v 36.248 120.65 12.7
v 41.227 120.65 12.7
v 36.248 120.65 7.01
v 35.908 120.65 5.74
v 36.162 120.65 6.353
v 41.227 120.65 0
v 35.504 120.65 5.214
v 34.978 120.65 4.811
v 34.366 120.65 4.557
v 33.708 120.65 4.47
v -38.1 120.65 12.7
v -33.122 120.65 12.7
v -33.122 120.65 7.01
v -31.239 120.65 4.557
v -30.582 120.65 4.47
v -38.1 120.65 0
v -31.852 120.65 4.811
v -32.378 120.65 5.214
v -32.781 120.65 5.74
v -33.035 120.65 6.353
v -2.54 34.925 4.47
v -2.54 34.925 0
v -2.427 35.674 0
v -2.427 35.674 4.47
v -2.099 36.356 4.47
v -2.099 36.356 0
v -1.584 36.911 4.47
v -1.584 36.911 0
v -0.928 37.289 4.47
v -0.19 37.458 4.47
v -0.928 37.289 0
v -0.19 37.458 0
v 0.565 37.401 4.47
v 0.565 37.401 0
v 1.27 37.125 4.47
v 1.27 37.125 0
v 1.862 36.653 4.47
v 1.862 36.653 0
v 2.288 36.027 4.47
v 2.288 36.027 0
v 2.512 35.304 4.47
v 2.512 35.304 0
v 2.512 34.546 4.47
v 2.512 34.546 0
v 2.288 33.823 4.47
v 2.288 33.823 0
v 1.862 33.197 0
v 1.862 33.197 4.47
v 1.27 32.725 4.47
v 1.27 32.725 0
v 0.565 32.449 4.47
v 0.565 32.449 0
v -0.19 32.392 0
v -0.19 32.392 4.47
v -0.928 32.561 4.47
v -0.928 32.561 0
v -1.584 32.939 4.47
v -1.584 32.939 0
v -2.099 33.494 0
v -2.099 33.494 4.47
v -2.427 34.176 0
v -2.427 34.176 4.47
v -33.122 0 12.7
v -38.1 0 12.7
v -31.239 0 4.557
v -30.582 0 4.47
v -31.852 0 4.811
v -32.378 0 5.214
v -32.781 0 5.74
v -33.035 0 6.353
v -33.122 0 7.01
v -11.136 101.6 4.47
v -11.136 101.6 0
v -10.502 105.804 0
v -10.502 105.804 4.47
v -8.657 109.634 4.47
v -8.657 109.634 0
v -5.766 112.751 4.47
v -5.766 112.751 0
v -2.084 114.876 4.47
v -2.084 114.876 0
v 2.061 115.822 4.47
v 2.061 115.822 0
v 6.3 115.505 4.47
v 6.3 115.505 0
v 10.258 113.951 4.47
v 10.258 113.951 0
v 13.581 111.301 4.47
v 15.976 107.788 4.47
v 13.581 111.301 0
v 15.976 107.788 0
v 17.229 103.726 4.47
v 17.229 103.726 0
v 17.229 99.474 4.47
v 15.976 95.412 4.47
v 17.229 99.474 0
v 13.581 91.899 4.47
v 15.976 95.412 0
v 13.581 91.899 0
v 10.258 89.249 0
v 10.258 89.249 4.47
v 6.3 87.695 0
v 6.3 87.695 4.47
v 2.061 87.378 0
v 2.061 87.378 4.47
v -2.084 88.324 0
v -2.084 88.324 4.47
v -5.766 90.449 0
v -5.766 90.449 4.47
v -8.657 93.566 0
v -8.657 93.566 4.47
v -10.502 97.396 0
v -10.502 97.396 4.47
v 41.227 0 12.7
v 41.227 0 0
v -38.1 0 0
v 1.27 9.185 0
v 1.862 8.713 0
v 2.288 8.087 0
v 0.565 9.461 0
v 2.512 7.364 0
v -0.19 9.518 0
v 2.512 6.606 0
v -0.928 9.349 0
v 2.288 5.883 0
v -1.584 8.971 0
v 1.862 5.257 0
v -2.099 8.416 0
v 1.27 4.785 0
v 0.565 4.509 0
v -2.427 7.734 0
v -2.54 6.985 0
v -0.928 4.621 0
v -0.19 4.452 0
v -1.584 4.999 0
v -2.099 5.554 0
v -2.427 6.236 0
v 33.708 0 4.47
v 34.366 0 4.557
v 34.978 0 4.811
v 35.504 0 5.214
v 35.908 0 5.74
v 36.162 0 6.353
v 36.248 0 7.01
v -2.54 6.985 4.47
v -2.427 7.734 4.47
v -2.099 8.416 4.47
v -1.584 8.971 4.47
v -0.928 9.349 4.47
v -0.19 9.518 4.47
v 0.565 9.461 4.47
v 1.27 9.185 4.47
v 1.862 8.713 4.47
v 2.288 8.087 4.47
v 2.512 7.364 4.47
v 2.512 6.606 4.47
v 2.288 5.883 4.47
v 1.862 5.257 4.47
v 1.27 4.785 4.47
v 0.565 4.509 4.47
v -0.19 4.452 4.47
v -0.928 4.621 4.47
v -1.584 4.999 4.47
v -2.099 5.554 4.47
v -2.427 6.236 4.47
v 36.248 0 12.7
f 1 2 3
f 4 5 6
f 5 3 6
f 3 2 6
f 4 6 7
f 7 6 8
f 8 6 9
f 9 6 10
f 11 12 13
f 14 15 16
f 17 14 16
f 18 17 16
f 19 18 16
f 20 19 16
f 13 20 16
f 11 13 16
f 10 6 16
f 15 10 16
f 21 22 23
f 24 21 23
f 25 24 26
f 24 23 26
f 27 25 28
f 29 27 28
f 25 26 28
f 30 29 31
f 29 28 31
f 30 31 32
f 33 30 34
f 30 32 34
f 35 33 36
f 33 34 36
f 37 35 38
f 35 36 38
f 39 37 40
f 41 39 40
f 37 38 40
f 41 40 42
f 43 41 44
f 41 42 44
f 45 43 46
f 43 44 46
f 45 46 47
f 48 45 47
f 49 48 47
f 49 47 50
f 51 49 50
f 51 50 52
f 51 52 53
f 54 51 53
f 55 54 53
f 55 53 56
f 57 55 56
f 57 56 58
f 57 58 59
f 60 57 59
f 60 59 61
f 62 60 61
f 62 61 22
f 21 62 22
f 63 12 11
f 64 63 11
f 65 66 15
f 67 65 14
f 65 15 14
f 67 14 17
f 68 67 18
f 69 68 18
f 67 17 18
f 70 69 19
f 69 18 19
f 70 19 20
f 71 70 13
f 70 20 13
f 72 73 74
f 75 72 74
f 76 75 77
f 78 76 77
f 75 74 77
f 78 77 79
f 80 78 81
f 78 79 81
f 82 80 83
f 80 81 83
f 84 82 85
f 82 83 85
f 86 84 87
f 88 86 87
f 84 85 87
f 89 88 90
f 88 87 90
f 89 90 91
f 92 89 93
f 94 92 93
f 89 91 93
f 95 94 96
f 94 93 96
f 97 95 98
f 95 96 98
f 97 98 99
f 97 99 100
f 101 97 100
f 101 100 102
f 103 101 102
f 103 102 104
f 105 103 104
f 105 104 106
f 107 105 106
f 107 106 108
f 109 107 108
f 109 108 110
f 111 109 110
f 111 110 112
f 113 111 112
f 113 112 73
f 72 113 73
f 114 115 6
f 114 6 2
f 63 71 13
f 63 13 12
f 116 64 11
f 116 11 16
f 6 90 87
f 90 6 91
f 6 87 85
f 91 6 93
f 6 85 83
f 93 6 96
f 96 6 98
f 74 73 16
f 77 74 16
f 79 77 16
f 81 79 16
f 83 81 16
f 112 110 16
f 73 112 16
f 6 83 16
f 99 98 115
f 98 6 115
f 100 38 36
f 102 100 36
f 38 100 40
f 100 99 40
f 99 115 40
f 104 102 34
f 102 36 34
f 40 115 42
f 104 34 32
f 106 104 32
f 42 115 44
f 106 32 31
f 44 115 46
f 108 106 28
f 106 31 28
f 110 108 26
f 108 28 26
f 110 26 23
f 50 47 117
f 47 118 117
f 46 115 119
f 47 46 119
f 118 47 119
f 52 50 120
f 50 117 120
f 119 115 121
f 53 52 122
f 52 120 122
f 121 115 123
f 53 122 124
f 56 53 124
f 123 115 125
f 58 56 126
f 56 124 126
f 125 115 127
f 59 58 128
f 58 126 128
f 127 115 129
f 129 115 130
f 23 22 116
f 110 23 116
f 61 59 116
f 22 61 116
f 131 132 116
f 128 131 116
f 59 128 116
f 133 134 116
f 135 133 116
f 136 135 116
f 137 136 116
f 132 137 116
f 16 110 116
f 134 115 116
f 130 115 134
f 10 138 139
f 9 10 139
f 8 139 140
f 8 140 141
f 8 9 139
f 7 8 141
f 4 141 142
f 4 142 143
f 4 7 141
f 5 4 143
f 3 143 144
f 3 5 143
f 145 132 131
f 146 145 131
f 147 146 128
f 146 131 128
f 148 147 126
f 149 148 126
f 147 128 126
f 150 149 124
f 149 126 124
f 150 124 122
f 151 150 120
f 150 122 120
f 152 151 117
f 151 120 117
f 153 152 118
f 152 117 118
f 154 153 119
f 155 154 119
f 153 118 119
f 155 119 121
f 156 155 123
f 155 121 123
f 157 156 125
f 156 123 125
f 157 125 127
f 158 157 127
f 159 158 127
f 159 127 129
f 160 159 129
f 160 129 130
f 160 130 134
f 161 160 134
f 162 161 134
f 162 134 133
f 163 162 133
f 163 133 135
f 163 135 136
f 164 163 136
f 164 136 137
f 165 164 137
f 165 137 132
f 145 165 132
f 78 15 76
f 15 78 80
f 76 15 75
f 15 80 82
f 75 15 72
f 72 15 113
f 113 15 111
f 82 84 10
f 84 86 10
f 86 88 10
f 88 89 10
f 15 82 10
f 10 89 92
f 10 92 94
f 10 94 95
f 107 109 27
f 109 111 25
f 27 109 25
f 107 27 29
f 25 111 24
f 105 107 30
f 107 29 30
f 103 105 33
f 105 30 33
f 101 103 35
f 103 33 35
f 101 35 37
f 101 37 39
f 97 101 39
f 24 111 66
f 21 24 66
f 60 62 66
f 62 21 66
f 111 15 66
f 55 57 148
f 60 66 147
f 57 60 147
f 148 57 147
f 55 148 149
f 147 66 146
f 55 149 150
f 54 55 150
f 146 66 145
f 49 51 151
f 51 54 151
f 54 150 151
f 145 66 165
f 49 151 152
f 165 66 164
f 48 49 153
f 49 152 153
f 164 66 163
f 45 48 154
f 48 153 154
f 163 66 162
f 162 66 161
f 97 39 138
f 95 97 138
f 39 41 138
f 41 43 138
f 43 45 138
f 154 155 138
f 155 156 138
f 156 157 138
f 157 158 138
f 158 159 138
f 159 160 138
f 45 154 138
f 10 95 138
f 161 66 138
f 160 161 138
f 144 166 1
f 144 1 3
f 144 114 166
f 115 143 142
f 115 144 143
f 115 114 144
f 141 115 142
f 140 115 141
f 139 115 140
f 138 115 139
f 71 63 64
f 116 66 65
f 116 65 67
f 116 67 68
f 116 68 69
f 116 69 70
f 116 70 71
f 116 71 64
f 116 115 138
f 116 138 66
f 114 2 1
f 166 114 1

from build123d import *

# Parameters (mm, degrees)
BOSS_EXTRUDE1_DEPTH = 120.65
SKETCH3_R           = 14.2621
CUT_EXTRUDE1_DEPTH  = 107.95
SKETCH4_R           = 2.54
CUT_EXTRUDE2_DEPTH  = 127
SKETCH5_R           = 2.54
CUT_EXTRUDE3_DEPTH  = 127
FILLET1_R           = 2.54
FILLET2_R           = 2.54


with BuildPart() as part:
    # Sketch2 → Boss-Extrude1 (new body)
    with BuildSketch(Plane(origin=(0, 0, 0), x_dir=(1, 0, 0), z_dir=(0, 1, 0))):
        Polygon((0, 0), (41.226518858, 0), (41.226518858, -12.7), (36.248118858, -12.7), (36.248118858, -4.4704), (0, -4.4704), (-33.1216, -4.4704), (-33.1216, -12.7), (-38.1, -12.7), (-38.1, 0), align=None)
    extrude(amount=BOSS_EXTRUDE1_DEPTH)

    # Sketch3 → Cut-Extrude1 (cut)
    with BuildSketch(Plane(origin=(0, 0, 0), x_dir=(-1, 0, 0), z_dir=(0, 0, -1))):
        with Locations((-3.126518858, 101.6)):
            Circle(SKETCH3_R)
    extrude(amount=-CUT_EXTRUDE1_DEPTH, mode=Mode.SUBTRACT)

    # Sketch4 → Cut-Extrude2 (cut)
    with BuildSketch(Plane(origin=(0, 0, 0), x_dir=(-1, 0, 0), z_dir=(0, 0, -1))):
        with Locations((0, 34.925)):
            Circle(SKETCH4_R)
    extrude(amount=-CUT_EXTRUDE2_DEPTH, mode=Mode.SUBTRACT)

    # Sketch5 → Cut-Extrude3 (cut)
    with BuildSketch(Plane(origin=(0, 0, 0), x_dir=(-1, 0, 0), z_dir=(0, 0, -1))):
        with Locations((0, 6.985)):
            Circle(SKETCH5_R)
    extrude(amount=-CUT_EXTRUDE3_DEPTH, mode=Mode.SUBTRACT)

    # Fillet1
    fillet1_edges = [part.edges().sort_by_distance(p)[0] for p in [
        (-33.1216, 60.325, 4.4704),
    ]]
    fillet(fillet1_edges, radius=FILLET1_R)

    # Fillet2
    fillet2_edges = [part.edges().sort_by_distance(p)[0] for p in [
        (36.248118858, 60.325, 4.4704),
    ]]
    fillet(fillet2_edges, radius=FILLET2_R)


solid = part.part
